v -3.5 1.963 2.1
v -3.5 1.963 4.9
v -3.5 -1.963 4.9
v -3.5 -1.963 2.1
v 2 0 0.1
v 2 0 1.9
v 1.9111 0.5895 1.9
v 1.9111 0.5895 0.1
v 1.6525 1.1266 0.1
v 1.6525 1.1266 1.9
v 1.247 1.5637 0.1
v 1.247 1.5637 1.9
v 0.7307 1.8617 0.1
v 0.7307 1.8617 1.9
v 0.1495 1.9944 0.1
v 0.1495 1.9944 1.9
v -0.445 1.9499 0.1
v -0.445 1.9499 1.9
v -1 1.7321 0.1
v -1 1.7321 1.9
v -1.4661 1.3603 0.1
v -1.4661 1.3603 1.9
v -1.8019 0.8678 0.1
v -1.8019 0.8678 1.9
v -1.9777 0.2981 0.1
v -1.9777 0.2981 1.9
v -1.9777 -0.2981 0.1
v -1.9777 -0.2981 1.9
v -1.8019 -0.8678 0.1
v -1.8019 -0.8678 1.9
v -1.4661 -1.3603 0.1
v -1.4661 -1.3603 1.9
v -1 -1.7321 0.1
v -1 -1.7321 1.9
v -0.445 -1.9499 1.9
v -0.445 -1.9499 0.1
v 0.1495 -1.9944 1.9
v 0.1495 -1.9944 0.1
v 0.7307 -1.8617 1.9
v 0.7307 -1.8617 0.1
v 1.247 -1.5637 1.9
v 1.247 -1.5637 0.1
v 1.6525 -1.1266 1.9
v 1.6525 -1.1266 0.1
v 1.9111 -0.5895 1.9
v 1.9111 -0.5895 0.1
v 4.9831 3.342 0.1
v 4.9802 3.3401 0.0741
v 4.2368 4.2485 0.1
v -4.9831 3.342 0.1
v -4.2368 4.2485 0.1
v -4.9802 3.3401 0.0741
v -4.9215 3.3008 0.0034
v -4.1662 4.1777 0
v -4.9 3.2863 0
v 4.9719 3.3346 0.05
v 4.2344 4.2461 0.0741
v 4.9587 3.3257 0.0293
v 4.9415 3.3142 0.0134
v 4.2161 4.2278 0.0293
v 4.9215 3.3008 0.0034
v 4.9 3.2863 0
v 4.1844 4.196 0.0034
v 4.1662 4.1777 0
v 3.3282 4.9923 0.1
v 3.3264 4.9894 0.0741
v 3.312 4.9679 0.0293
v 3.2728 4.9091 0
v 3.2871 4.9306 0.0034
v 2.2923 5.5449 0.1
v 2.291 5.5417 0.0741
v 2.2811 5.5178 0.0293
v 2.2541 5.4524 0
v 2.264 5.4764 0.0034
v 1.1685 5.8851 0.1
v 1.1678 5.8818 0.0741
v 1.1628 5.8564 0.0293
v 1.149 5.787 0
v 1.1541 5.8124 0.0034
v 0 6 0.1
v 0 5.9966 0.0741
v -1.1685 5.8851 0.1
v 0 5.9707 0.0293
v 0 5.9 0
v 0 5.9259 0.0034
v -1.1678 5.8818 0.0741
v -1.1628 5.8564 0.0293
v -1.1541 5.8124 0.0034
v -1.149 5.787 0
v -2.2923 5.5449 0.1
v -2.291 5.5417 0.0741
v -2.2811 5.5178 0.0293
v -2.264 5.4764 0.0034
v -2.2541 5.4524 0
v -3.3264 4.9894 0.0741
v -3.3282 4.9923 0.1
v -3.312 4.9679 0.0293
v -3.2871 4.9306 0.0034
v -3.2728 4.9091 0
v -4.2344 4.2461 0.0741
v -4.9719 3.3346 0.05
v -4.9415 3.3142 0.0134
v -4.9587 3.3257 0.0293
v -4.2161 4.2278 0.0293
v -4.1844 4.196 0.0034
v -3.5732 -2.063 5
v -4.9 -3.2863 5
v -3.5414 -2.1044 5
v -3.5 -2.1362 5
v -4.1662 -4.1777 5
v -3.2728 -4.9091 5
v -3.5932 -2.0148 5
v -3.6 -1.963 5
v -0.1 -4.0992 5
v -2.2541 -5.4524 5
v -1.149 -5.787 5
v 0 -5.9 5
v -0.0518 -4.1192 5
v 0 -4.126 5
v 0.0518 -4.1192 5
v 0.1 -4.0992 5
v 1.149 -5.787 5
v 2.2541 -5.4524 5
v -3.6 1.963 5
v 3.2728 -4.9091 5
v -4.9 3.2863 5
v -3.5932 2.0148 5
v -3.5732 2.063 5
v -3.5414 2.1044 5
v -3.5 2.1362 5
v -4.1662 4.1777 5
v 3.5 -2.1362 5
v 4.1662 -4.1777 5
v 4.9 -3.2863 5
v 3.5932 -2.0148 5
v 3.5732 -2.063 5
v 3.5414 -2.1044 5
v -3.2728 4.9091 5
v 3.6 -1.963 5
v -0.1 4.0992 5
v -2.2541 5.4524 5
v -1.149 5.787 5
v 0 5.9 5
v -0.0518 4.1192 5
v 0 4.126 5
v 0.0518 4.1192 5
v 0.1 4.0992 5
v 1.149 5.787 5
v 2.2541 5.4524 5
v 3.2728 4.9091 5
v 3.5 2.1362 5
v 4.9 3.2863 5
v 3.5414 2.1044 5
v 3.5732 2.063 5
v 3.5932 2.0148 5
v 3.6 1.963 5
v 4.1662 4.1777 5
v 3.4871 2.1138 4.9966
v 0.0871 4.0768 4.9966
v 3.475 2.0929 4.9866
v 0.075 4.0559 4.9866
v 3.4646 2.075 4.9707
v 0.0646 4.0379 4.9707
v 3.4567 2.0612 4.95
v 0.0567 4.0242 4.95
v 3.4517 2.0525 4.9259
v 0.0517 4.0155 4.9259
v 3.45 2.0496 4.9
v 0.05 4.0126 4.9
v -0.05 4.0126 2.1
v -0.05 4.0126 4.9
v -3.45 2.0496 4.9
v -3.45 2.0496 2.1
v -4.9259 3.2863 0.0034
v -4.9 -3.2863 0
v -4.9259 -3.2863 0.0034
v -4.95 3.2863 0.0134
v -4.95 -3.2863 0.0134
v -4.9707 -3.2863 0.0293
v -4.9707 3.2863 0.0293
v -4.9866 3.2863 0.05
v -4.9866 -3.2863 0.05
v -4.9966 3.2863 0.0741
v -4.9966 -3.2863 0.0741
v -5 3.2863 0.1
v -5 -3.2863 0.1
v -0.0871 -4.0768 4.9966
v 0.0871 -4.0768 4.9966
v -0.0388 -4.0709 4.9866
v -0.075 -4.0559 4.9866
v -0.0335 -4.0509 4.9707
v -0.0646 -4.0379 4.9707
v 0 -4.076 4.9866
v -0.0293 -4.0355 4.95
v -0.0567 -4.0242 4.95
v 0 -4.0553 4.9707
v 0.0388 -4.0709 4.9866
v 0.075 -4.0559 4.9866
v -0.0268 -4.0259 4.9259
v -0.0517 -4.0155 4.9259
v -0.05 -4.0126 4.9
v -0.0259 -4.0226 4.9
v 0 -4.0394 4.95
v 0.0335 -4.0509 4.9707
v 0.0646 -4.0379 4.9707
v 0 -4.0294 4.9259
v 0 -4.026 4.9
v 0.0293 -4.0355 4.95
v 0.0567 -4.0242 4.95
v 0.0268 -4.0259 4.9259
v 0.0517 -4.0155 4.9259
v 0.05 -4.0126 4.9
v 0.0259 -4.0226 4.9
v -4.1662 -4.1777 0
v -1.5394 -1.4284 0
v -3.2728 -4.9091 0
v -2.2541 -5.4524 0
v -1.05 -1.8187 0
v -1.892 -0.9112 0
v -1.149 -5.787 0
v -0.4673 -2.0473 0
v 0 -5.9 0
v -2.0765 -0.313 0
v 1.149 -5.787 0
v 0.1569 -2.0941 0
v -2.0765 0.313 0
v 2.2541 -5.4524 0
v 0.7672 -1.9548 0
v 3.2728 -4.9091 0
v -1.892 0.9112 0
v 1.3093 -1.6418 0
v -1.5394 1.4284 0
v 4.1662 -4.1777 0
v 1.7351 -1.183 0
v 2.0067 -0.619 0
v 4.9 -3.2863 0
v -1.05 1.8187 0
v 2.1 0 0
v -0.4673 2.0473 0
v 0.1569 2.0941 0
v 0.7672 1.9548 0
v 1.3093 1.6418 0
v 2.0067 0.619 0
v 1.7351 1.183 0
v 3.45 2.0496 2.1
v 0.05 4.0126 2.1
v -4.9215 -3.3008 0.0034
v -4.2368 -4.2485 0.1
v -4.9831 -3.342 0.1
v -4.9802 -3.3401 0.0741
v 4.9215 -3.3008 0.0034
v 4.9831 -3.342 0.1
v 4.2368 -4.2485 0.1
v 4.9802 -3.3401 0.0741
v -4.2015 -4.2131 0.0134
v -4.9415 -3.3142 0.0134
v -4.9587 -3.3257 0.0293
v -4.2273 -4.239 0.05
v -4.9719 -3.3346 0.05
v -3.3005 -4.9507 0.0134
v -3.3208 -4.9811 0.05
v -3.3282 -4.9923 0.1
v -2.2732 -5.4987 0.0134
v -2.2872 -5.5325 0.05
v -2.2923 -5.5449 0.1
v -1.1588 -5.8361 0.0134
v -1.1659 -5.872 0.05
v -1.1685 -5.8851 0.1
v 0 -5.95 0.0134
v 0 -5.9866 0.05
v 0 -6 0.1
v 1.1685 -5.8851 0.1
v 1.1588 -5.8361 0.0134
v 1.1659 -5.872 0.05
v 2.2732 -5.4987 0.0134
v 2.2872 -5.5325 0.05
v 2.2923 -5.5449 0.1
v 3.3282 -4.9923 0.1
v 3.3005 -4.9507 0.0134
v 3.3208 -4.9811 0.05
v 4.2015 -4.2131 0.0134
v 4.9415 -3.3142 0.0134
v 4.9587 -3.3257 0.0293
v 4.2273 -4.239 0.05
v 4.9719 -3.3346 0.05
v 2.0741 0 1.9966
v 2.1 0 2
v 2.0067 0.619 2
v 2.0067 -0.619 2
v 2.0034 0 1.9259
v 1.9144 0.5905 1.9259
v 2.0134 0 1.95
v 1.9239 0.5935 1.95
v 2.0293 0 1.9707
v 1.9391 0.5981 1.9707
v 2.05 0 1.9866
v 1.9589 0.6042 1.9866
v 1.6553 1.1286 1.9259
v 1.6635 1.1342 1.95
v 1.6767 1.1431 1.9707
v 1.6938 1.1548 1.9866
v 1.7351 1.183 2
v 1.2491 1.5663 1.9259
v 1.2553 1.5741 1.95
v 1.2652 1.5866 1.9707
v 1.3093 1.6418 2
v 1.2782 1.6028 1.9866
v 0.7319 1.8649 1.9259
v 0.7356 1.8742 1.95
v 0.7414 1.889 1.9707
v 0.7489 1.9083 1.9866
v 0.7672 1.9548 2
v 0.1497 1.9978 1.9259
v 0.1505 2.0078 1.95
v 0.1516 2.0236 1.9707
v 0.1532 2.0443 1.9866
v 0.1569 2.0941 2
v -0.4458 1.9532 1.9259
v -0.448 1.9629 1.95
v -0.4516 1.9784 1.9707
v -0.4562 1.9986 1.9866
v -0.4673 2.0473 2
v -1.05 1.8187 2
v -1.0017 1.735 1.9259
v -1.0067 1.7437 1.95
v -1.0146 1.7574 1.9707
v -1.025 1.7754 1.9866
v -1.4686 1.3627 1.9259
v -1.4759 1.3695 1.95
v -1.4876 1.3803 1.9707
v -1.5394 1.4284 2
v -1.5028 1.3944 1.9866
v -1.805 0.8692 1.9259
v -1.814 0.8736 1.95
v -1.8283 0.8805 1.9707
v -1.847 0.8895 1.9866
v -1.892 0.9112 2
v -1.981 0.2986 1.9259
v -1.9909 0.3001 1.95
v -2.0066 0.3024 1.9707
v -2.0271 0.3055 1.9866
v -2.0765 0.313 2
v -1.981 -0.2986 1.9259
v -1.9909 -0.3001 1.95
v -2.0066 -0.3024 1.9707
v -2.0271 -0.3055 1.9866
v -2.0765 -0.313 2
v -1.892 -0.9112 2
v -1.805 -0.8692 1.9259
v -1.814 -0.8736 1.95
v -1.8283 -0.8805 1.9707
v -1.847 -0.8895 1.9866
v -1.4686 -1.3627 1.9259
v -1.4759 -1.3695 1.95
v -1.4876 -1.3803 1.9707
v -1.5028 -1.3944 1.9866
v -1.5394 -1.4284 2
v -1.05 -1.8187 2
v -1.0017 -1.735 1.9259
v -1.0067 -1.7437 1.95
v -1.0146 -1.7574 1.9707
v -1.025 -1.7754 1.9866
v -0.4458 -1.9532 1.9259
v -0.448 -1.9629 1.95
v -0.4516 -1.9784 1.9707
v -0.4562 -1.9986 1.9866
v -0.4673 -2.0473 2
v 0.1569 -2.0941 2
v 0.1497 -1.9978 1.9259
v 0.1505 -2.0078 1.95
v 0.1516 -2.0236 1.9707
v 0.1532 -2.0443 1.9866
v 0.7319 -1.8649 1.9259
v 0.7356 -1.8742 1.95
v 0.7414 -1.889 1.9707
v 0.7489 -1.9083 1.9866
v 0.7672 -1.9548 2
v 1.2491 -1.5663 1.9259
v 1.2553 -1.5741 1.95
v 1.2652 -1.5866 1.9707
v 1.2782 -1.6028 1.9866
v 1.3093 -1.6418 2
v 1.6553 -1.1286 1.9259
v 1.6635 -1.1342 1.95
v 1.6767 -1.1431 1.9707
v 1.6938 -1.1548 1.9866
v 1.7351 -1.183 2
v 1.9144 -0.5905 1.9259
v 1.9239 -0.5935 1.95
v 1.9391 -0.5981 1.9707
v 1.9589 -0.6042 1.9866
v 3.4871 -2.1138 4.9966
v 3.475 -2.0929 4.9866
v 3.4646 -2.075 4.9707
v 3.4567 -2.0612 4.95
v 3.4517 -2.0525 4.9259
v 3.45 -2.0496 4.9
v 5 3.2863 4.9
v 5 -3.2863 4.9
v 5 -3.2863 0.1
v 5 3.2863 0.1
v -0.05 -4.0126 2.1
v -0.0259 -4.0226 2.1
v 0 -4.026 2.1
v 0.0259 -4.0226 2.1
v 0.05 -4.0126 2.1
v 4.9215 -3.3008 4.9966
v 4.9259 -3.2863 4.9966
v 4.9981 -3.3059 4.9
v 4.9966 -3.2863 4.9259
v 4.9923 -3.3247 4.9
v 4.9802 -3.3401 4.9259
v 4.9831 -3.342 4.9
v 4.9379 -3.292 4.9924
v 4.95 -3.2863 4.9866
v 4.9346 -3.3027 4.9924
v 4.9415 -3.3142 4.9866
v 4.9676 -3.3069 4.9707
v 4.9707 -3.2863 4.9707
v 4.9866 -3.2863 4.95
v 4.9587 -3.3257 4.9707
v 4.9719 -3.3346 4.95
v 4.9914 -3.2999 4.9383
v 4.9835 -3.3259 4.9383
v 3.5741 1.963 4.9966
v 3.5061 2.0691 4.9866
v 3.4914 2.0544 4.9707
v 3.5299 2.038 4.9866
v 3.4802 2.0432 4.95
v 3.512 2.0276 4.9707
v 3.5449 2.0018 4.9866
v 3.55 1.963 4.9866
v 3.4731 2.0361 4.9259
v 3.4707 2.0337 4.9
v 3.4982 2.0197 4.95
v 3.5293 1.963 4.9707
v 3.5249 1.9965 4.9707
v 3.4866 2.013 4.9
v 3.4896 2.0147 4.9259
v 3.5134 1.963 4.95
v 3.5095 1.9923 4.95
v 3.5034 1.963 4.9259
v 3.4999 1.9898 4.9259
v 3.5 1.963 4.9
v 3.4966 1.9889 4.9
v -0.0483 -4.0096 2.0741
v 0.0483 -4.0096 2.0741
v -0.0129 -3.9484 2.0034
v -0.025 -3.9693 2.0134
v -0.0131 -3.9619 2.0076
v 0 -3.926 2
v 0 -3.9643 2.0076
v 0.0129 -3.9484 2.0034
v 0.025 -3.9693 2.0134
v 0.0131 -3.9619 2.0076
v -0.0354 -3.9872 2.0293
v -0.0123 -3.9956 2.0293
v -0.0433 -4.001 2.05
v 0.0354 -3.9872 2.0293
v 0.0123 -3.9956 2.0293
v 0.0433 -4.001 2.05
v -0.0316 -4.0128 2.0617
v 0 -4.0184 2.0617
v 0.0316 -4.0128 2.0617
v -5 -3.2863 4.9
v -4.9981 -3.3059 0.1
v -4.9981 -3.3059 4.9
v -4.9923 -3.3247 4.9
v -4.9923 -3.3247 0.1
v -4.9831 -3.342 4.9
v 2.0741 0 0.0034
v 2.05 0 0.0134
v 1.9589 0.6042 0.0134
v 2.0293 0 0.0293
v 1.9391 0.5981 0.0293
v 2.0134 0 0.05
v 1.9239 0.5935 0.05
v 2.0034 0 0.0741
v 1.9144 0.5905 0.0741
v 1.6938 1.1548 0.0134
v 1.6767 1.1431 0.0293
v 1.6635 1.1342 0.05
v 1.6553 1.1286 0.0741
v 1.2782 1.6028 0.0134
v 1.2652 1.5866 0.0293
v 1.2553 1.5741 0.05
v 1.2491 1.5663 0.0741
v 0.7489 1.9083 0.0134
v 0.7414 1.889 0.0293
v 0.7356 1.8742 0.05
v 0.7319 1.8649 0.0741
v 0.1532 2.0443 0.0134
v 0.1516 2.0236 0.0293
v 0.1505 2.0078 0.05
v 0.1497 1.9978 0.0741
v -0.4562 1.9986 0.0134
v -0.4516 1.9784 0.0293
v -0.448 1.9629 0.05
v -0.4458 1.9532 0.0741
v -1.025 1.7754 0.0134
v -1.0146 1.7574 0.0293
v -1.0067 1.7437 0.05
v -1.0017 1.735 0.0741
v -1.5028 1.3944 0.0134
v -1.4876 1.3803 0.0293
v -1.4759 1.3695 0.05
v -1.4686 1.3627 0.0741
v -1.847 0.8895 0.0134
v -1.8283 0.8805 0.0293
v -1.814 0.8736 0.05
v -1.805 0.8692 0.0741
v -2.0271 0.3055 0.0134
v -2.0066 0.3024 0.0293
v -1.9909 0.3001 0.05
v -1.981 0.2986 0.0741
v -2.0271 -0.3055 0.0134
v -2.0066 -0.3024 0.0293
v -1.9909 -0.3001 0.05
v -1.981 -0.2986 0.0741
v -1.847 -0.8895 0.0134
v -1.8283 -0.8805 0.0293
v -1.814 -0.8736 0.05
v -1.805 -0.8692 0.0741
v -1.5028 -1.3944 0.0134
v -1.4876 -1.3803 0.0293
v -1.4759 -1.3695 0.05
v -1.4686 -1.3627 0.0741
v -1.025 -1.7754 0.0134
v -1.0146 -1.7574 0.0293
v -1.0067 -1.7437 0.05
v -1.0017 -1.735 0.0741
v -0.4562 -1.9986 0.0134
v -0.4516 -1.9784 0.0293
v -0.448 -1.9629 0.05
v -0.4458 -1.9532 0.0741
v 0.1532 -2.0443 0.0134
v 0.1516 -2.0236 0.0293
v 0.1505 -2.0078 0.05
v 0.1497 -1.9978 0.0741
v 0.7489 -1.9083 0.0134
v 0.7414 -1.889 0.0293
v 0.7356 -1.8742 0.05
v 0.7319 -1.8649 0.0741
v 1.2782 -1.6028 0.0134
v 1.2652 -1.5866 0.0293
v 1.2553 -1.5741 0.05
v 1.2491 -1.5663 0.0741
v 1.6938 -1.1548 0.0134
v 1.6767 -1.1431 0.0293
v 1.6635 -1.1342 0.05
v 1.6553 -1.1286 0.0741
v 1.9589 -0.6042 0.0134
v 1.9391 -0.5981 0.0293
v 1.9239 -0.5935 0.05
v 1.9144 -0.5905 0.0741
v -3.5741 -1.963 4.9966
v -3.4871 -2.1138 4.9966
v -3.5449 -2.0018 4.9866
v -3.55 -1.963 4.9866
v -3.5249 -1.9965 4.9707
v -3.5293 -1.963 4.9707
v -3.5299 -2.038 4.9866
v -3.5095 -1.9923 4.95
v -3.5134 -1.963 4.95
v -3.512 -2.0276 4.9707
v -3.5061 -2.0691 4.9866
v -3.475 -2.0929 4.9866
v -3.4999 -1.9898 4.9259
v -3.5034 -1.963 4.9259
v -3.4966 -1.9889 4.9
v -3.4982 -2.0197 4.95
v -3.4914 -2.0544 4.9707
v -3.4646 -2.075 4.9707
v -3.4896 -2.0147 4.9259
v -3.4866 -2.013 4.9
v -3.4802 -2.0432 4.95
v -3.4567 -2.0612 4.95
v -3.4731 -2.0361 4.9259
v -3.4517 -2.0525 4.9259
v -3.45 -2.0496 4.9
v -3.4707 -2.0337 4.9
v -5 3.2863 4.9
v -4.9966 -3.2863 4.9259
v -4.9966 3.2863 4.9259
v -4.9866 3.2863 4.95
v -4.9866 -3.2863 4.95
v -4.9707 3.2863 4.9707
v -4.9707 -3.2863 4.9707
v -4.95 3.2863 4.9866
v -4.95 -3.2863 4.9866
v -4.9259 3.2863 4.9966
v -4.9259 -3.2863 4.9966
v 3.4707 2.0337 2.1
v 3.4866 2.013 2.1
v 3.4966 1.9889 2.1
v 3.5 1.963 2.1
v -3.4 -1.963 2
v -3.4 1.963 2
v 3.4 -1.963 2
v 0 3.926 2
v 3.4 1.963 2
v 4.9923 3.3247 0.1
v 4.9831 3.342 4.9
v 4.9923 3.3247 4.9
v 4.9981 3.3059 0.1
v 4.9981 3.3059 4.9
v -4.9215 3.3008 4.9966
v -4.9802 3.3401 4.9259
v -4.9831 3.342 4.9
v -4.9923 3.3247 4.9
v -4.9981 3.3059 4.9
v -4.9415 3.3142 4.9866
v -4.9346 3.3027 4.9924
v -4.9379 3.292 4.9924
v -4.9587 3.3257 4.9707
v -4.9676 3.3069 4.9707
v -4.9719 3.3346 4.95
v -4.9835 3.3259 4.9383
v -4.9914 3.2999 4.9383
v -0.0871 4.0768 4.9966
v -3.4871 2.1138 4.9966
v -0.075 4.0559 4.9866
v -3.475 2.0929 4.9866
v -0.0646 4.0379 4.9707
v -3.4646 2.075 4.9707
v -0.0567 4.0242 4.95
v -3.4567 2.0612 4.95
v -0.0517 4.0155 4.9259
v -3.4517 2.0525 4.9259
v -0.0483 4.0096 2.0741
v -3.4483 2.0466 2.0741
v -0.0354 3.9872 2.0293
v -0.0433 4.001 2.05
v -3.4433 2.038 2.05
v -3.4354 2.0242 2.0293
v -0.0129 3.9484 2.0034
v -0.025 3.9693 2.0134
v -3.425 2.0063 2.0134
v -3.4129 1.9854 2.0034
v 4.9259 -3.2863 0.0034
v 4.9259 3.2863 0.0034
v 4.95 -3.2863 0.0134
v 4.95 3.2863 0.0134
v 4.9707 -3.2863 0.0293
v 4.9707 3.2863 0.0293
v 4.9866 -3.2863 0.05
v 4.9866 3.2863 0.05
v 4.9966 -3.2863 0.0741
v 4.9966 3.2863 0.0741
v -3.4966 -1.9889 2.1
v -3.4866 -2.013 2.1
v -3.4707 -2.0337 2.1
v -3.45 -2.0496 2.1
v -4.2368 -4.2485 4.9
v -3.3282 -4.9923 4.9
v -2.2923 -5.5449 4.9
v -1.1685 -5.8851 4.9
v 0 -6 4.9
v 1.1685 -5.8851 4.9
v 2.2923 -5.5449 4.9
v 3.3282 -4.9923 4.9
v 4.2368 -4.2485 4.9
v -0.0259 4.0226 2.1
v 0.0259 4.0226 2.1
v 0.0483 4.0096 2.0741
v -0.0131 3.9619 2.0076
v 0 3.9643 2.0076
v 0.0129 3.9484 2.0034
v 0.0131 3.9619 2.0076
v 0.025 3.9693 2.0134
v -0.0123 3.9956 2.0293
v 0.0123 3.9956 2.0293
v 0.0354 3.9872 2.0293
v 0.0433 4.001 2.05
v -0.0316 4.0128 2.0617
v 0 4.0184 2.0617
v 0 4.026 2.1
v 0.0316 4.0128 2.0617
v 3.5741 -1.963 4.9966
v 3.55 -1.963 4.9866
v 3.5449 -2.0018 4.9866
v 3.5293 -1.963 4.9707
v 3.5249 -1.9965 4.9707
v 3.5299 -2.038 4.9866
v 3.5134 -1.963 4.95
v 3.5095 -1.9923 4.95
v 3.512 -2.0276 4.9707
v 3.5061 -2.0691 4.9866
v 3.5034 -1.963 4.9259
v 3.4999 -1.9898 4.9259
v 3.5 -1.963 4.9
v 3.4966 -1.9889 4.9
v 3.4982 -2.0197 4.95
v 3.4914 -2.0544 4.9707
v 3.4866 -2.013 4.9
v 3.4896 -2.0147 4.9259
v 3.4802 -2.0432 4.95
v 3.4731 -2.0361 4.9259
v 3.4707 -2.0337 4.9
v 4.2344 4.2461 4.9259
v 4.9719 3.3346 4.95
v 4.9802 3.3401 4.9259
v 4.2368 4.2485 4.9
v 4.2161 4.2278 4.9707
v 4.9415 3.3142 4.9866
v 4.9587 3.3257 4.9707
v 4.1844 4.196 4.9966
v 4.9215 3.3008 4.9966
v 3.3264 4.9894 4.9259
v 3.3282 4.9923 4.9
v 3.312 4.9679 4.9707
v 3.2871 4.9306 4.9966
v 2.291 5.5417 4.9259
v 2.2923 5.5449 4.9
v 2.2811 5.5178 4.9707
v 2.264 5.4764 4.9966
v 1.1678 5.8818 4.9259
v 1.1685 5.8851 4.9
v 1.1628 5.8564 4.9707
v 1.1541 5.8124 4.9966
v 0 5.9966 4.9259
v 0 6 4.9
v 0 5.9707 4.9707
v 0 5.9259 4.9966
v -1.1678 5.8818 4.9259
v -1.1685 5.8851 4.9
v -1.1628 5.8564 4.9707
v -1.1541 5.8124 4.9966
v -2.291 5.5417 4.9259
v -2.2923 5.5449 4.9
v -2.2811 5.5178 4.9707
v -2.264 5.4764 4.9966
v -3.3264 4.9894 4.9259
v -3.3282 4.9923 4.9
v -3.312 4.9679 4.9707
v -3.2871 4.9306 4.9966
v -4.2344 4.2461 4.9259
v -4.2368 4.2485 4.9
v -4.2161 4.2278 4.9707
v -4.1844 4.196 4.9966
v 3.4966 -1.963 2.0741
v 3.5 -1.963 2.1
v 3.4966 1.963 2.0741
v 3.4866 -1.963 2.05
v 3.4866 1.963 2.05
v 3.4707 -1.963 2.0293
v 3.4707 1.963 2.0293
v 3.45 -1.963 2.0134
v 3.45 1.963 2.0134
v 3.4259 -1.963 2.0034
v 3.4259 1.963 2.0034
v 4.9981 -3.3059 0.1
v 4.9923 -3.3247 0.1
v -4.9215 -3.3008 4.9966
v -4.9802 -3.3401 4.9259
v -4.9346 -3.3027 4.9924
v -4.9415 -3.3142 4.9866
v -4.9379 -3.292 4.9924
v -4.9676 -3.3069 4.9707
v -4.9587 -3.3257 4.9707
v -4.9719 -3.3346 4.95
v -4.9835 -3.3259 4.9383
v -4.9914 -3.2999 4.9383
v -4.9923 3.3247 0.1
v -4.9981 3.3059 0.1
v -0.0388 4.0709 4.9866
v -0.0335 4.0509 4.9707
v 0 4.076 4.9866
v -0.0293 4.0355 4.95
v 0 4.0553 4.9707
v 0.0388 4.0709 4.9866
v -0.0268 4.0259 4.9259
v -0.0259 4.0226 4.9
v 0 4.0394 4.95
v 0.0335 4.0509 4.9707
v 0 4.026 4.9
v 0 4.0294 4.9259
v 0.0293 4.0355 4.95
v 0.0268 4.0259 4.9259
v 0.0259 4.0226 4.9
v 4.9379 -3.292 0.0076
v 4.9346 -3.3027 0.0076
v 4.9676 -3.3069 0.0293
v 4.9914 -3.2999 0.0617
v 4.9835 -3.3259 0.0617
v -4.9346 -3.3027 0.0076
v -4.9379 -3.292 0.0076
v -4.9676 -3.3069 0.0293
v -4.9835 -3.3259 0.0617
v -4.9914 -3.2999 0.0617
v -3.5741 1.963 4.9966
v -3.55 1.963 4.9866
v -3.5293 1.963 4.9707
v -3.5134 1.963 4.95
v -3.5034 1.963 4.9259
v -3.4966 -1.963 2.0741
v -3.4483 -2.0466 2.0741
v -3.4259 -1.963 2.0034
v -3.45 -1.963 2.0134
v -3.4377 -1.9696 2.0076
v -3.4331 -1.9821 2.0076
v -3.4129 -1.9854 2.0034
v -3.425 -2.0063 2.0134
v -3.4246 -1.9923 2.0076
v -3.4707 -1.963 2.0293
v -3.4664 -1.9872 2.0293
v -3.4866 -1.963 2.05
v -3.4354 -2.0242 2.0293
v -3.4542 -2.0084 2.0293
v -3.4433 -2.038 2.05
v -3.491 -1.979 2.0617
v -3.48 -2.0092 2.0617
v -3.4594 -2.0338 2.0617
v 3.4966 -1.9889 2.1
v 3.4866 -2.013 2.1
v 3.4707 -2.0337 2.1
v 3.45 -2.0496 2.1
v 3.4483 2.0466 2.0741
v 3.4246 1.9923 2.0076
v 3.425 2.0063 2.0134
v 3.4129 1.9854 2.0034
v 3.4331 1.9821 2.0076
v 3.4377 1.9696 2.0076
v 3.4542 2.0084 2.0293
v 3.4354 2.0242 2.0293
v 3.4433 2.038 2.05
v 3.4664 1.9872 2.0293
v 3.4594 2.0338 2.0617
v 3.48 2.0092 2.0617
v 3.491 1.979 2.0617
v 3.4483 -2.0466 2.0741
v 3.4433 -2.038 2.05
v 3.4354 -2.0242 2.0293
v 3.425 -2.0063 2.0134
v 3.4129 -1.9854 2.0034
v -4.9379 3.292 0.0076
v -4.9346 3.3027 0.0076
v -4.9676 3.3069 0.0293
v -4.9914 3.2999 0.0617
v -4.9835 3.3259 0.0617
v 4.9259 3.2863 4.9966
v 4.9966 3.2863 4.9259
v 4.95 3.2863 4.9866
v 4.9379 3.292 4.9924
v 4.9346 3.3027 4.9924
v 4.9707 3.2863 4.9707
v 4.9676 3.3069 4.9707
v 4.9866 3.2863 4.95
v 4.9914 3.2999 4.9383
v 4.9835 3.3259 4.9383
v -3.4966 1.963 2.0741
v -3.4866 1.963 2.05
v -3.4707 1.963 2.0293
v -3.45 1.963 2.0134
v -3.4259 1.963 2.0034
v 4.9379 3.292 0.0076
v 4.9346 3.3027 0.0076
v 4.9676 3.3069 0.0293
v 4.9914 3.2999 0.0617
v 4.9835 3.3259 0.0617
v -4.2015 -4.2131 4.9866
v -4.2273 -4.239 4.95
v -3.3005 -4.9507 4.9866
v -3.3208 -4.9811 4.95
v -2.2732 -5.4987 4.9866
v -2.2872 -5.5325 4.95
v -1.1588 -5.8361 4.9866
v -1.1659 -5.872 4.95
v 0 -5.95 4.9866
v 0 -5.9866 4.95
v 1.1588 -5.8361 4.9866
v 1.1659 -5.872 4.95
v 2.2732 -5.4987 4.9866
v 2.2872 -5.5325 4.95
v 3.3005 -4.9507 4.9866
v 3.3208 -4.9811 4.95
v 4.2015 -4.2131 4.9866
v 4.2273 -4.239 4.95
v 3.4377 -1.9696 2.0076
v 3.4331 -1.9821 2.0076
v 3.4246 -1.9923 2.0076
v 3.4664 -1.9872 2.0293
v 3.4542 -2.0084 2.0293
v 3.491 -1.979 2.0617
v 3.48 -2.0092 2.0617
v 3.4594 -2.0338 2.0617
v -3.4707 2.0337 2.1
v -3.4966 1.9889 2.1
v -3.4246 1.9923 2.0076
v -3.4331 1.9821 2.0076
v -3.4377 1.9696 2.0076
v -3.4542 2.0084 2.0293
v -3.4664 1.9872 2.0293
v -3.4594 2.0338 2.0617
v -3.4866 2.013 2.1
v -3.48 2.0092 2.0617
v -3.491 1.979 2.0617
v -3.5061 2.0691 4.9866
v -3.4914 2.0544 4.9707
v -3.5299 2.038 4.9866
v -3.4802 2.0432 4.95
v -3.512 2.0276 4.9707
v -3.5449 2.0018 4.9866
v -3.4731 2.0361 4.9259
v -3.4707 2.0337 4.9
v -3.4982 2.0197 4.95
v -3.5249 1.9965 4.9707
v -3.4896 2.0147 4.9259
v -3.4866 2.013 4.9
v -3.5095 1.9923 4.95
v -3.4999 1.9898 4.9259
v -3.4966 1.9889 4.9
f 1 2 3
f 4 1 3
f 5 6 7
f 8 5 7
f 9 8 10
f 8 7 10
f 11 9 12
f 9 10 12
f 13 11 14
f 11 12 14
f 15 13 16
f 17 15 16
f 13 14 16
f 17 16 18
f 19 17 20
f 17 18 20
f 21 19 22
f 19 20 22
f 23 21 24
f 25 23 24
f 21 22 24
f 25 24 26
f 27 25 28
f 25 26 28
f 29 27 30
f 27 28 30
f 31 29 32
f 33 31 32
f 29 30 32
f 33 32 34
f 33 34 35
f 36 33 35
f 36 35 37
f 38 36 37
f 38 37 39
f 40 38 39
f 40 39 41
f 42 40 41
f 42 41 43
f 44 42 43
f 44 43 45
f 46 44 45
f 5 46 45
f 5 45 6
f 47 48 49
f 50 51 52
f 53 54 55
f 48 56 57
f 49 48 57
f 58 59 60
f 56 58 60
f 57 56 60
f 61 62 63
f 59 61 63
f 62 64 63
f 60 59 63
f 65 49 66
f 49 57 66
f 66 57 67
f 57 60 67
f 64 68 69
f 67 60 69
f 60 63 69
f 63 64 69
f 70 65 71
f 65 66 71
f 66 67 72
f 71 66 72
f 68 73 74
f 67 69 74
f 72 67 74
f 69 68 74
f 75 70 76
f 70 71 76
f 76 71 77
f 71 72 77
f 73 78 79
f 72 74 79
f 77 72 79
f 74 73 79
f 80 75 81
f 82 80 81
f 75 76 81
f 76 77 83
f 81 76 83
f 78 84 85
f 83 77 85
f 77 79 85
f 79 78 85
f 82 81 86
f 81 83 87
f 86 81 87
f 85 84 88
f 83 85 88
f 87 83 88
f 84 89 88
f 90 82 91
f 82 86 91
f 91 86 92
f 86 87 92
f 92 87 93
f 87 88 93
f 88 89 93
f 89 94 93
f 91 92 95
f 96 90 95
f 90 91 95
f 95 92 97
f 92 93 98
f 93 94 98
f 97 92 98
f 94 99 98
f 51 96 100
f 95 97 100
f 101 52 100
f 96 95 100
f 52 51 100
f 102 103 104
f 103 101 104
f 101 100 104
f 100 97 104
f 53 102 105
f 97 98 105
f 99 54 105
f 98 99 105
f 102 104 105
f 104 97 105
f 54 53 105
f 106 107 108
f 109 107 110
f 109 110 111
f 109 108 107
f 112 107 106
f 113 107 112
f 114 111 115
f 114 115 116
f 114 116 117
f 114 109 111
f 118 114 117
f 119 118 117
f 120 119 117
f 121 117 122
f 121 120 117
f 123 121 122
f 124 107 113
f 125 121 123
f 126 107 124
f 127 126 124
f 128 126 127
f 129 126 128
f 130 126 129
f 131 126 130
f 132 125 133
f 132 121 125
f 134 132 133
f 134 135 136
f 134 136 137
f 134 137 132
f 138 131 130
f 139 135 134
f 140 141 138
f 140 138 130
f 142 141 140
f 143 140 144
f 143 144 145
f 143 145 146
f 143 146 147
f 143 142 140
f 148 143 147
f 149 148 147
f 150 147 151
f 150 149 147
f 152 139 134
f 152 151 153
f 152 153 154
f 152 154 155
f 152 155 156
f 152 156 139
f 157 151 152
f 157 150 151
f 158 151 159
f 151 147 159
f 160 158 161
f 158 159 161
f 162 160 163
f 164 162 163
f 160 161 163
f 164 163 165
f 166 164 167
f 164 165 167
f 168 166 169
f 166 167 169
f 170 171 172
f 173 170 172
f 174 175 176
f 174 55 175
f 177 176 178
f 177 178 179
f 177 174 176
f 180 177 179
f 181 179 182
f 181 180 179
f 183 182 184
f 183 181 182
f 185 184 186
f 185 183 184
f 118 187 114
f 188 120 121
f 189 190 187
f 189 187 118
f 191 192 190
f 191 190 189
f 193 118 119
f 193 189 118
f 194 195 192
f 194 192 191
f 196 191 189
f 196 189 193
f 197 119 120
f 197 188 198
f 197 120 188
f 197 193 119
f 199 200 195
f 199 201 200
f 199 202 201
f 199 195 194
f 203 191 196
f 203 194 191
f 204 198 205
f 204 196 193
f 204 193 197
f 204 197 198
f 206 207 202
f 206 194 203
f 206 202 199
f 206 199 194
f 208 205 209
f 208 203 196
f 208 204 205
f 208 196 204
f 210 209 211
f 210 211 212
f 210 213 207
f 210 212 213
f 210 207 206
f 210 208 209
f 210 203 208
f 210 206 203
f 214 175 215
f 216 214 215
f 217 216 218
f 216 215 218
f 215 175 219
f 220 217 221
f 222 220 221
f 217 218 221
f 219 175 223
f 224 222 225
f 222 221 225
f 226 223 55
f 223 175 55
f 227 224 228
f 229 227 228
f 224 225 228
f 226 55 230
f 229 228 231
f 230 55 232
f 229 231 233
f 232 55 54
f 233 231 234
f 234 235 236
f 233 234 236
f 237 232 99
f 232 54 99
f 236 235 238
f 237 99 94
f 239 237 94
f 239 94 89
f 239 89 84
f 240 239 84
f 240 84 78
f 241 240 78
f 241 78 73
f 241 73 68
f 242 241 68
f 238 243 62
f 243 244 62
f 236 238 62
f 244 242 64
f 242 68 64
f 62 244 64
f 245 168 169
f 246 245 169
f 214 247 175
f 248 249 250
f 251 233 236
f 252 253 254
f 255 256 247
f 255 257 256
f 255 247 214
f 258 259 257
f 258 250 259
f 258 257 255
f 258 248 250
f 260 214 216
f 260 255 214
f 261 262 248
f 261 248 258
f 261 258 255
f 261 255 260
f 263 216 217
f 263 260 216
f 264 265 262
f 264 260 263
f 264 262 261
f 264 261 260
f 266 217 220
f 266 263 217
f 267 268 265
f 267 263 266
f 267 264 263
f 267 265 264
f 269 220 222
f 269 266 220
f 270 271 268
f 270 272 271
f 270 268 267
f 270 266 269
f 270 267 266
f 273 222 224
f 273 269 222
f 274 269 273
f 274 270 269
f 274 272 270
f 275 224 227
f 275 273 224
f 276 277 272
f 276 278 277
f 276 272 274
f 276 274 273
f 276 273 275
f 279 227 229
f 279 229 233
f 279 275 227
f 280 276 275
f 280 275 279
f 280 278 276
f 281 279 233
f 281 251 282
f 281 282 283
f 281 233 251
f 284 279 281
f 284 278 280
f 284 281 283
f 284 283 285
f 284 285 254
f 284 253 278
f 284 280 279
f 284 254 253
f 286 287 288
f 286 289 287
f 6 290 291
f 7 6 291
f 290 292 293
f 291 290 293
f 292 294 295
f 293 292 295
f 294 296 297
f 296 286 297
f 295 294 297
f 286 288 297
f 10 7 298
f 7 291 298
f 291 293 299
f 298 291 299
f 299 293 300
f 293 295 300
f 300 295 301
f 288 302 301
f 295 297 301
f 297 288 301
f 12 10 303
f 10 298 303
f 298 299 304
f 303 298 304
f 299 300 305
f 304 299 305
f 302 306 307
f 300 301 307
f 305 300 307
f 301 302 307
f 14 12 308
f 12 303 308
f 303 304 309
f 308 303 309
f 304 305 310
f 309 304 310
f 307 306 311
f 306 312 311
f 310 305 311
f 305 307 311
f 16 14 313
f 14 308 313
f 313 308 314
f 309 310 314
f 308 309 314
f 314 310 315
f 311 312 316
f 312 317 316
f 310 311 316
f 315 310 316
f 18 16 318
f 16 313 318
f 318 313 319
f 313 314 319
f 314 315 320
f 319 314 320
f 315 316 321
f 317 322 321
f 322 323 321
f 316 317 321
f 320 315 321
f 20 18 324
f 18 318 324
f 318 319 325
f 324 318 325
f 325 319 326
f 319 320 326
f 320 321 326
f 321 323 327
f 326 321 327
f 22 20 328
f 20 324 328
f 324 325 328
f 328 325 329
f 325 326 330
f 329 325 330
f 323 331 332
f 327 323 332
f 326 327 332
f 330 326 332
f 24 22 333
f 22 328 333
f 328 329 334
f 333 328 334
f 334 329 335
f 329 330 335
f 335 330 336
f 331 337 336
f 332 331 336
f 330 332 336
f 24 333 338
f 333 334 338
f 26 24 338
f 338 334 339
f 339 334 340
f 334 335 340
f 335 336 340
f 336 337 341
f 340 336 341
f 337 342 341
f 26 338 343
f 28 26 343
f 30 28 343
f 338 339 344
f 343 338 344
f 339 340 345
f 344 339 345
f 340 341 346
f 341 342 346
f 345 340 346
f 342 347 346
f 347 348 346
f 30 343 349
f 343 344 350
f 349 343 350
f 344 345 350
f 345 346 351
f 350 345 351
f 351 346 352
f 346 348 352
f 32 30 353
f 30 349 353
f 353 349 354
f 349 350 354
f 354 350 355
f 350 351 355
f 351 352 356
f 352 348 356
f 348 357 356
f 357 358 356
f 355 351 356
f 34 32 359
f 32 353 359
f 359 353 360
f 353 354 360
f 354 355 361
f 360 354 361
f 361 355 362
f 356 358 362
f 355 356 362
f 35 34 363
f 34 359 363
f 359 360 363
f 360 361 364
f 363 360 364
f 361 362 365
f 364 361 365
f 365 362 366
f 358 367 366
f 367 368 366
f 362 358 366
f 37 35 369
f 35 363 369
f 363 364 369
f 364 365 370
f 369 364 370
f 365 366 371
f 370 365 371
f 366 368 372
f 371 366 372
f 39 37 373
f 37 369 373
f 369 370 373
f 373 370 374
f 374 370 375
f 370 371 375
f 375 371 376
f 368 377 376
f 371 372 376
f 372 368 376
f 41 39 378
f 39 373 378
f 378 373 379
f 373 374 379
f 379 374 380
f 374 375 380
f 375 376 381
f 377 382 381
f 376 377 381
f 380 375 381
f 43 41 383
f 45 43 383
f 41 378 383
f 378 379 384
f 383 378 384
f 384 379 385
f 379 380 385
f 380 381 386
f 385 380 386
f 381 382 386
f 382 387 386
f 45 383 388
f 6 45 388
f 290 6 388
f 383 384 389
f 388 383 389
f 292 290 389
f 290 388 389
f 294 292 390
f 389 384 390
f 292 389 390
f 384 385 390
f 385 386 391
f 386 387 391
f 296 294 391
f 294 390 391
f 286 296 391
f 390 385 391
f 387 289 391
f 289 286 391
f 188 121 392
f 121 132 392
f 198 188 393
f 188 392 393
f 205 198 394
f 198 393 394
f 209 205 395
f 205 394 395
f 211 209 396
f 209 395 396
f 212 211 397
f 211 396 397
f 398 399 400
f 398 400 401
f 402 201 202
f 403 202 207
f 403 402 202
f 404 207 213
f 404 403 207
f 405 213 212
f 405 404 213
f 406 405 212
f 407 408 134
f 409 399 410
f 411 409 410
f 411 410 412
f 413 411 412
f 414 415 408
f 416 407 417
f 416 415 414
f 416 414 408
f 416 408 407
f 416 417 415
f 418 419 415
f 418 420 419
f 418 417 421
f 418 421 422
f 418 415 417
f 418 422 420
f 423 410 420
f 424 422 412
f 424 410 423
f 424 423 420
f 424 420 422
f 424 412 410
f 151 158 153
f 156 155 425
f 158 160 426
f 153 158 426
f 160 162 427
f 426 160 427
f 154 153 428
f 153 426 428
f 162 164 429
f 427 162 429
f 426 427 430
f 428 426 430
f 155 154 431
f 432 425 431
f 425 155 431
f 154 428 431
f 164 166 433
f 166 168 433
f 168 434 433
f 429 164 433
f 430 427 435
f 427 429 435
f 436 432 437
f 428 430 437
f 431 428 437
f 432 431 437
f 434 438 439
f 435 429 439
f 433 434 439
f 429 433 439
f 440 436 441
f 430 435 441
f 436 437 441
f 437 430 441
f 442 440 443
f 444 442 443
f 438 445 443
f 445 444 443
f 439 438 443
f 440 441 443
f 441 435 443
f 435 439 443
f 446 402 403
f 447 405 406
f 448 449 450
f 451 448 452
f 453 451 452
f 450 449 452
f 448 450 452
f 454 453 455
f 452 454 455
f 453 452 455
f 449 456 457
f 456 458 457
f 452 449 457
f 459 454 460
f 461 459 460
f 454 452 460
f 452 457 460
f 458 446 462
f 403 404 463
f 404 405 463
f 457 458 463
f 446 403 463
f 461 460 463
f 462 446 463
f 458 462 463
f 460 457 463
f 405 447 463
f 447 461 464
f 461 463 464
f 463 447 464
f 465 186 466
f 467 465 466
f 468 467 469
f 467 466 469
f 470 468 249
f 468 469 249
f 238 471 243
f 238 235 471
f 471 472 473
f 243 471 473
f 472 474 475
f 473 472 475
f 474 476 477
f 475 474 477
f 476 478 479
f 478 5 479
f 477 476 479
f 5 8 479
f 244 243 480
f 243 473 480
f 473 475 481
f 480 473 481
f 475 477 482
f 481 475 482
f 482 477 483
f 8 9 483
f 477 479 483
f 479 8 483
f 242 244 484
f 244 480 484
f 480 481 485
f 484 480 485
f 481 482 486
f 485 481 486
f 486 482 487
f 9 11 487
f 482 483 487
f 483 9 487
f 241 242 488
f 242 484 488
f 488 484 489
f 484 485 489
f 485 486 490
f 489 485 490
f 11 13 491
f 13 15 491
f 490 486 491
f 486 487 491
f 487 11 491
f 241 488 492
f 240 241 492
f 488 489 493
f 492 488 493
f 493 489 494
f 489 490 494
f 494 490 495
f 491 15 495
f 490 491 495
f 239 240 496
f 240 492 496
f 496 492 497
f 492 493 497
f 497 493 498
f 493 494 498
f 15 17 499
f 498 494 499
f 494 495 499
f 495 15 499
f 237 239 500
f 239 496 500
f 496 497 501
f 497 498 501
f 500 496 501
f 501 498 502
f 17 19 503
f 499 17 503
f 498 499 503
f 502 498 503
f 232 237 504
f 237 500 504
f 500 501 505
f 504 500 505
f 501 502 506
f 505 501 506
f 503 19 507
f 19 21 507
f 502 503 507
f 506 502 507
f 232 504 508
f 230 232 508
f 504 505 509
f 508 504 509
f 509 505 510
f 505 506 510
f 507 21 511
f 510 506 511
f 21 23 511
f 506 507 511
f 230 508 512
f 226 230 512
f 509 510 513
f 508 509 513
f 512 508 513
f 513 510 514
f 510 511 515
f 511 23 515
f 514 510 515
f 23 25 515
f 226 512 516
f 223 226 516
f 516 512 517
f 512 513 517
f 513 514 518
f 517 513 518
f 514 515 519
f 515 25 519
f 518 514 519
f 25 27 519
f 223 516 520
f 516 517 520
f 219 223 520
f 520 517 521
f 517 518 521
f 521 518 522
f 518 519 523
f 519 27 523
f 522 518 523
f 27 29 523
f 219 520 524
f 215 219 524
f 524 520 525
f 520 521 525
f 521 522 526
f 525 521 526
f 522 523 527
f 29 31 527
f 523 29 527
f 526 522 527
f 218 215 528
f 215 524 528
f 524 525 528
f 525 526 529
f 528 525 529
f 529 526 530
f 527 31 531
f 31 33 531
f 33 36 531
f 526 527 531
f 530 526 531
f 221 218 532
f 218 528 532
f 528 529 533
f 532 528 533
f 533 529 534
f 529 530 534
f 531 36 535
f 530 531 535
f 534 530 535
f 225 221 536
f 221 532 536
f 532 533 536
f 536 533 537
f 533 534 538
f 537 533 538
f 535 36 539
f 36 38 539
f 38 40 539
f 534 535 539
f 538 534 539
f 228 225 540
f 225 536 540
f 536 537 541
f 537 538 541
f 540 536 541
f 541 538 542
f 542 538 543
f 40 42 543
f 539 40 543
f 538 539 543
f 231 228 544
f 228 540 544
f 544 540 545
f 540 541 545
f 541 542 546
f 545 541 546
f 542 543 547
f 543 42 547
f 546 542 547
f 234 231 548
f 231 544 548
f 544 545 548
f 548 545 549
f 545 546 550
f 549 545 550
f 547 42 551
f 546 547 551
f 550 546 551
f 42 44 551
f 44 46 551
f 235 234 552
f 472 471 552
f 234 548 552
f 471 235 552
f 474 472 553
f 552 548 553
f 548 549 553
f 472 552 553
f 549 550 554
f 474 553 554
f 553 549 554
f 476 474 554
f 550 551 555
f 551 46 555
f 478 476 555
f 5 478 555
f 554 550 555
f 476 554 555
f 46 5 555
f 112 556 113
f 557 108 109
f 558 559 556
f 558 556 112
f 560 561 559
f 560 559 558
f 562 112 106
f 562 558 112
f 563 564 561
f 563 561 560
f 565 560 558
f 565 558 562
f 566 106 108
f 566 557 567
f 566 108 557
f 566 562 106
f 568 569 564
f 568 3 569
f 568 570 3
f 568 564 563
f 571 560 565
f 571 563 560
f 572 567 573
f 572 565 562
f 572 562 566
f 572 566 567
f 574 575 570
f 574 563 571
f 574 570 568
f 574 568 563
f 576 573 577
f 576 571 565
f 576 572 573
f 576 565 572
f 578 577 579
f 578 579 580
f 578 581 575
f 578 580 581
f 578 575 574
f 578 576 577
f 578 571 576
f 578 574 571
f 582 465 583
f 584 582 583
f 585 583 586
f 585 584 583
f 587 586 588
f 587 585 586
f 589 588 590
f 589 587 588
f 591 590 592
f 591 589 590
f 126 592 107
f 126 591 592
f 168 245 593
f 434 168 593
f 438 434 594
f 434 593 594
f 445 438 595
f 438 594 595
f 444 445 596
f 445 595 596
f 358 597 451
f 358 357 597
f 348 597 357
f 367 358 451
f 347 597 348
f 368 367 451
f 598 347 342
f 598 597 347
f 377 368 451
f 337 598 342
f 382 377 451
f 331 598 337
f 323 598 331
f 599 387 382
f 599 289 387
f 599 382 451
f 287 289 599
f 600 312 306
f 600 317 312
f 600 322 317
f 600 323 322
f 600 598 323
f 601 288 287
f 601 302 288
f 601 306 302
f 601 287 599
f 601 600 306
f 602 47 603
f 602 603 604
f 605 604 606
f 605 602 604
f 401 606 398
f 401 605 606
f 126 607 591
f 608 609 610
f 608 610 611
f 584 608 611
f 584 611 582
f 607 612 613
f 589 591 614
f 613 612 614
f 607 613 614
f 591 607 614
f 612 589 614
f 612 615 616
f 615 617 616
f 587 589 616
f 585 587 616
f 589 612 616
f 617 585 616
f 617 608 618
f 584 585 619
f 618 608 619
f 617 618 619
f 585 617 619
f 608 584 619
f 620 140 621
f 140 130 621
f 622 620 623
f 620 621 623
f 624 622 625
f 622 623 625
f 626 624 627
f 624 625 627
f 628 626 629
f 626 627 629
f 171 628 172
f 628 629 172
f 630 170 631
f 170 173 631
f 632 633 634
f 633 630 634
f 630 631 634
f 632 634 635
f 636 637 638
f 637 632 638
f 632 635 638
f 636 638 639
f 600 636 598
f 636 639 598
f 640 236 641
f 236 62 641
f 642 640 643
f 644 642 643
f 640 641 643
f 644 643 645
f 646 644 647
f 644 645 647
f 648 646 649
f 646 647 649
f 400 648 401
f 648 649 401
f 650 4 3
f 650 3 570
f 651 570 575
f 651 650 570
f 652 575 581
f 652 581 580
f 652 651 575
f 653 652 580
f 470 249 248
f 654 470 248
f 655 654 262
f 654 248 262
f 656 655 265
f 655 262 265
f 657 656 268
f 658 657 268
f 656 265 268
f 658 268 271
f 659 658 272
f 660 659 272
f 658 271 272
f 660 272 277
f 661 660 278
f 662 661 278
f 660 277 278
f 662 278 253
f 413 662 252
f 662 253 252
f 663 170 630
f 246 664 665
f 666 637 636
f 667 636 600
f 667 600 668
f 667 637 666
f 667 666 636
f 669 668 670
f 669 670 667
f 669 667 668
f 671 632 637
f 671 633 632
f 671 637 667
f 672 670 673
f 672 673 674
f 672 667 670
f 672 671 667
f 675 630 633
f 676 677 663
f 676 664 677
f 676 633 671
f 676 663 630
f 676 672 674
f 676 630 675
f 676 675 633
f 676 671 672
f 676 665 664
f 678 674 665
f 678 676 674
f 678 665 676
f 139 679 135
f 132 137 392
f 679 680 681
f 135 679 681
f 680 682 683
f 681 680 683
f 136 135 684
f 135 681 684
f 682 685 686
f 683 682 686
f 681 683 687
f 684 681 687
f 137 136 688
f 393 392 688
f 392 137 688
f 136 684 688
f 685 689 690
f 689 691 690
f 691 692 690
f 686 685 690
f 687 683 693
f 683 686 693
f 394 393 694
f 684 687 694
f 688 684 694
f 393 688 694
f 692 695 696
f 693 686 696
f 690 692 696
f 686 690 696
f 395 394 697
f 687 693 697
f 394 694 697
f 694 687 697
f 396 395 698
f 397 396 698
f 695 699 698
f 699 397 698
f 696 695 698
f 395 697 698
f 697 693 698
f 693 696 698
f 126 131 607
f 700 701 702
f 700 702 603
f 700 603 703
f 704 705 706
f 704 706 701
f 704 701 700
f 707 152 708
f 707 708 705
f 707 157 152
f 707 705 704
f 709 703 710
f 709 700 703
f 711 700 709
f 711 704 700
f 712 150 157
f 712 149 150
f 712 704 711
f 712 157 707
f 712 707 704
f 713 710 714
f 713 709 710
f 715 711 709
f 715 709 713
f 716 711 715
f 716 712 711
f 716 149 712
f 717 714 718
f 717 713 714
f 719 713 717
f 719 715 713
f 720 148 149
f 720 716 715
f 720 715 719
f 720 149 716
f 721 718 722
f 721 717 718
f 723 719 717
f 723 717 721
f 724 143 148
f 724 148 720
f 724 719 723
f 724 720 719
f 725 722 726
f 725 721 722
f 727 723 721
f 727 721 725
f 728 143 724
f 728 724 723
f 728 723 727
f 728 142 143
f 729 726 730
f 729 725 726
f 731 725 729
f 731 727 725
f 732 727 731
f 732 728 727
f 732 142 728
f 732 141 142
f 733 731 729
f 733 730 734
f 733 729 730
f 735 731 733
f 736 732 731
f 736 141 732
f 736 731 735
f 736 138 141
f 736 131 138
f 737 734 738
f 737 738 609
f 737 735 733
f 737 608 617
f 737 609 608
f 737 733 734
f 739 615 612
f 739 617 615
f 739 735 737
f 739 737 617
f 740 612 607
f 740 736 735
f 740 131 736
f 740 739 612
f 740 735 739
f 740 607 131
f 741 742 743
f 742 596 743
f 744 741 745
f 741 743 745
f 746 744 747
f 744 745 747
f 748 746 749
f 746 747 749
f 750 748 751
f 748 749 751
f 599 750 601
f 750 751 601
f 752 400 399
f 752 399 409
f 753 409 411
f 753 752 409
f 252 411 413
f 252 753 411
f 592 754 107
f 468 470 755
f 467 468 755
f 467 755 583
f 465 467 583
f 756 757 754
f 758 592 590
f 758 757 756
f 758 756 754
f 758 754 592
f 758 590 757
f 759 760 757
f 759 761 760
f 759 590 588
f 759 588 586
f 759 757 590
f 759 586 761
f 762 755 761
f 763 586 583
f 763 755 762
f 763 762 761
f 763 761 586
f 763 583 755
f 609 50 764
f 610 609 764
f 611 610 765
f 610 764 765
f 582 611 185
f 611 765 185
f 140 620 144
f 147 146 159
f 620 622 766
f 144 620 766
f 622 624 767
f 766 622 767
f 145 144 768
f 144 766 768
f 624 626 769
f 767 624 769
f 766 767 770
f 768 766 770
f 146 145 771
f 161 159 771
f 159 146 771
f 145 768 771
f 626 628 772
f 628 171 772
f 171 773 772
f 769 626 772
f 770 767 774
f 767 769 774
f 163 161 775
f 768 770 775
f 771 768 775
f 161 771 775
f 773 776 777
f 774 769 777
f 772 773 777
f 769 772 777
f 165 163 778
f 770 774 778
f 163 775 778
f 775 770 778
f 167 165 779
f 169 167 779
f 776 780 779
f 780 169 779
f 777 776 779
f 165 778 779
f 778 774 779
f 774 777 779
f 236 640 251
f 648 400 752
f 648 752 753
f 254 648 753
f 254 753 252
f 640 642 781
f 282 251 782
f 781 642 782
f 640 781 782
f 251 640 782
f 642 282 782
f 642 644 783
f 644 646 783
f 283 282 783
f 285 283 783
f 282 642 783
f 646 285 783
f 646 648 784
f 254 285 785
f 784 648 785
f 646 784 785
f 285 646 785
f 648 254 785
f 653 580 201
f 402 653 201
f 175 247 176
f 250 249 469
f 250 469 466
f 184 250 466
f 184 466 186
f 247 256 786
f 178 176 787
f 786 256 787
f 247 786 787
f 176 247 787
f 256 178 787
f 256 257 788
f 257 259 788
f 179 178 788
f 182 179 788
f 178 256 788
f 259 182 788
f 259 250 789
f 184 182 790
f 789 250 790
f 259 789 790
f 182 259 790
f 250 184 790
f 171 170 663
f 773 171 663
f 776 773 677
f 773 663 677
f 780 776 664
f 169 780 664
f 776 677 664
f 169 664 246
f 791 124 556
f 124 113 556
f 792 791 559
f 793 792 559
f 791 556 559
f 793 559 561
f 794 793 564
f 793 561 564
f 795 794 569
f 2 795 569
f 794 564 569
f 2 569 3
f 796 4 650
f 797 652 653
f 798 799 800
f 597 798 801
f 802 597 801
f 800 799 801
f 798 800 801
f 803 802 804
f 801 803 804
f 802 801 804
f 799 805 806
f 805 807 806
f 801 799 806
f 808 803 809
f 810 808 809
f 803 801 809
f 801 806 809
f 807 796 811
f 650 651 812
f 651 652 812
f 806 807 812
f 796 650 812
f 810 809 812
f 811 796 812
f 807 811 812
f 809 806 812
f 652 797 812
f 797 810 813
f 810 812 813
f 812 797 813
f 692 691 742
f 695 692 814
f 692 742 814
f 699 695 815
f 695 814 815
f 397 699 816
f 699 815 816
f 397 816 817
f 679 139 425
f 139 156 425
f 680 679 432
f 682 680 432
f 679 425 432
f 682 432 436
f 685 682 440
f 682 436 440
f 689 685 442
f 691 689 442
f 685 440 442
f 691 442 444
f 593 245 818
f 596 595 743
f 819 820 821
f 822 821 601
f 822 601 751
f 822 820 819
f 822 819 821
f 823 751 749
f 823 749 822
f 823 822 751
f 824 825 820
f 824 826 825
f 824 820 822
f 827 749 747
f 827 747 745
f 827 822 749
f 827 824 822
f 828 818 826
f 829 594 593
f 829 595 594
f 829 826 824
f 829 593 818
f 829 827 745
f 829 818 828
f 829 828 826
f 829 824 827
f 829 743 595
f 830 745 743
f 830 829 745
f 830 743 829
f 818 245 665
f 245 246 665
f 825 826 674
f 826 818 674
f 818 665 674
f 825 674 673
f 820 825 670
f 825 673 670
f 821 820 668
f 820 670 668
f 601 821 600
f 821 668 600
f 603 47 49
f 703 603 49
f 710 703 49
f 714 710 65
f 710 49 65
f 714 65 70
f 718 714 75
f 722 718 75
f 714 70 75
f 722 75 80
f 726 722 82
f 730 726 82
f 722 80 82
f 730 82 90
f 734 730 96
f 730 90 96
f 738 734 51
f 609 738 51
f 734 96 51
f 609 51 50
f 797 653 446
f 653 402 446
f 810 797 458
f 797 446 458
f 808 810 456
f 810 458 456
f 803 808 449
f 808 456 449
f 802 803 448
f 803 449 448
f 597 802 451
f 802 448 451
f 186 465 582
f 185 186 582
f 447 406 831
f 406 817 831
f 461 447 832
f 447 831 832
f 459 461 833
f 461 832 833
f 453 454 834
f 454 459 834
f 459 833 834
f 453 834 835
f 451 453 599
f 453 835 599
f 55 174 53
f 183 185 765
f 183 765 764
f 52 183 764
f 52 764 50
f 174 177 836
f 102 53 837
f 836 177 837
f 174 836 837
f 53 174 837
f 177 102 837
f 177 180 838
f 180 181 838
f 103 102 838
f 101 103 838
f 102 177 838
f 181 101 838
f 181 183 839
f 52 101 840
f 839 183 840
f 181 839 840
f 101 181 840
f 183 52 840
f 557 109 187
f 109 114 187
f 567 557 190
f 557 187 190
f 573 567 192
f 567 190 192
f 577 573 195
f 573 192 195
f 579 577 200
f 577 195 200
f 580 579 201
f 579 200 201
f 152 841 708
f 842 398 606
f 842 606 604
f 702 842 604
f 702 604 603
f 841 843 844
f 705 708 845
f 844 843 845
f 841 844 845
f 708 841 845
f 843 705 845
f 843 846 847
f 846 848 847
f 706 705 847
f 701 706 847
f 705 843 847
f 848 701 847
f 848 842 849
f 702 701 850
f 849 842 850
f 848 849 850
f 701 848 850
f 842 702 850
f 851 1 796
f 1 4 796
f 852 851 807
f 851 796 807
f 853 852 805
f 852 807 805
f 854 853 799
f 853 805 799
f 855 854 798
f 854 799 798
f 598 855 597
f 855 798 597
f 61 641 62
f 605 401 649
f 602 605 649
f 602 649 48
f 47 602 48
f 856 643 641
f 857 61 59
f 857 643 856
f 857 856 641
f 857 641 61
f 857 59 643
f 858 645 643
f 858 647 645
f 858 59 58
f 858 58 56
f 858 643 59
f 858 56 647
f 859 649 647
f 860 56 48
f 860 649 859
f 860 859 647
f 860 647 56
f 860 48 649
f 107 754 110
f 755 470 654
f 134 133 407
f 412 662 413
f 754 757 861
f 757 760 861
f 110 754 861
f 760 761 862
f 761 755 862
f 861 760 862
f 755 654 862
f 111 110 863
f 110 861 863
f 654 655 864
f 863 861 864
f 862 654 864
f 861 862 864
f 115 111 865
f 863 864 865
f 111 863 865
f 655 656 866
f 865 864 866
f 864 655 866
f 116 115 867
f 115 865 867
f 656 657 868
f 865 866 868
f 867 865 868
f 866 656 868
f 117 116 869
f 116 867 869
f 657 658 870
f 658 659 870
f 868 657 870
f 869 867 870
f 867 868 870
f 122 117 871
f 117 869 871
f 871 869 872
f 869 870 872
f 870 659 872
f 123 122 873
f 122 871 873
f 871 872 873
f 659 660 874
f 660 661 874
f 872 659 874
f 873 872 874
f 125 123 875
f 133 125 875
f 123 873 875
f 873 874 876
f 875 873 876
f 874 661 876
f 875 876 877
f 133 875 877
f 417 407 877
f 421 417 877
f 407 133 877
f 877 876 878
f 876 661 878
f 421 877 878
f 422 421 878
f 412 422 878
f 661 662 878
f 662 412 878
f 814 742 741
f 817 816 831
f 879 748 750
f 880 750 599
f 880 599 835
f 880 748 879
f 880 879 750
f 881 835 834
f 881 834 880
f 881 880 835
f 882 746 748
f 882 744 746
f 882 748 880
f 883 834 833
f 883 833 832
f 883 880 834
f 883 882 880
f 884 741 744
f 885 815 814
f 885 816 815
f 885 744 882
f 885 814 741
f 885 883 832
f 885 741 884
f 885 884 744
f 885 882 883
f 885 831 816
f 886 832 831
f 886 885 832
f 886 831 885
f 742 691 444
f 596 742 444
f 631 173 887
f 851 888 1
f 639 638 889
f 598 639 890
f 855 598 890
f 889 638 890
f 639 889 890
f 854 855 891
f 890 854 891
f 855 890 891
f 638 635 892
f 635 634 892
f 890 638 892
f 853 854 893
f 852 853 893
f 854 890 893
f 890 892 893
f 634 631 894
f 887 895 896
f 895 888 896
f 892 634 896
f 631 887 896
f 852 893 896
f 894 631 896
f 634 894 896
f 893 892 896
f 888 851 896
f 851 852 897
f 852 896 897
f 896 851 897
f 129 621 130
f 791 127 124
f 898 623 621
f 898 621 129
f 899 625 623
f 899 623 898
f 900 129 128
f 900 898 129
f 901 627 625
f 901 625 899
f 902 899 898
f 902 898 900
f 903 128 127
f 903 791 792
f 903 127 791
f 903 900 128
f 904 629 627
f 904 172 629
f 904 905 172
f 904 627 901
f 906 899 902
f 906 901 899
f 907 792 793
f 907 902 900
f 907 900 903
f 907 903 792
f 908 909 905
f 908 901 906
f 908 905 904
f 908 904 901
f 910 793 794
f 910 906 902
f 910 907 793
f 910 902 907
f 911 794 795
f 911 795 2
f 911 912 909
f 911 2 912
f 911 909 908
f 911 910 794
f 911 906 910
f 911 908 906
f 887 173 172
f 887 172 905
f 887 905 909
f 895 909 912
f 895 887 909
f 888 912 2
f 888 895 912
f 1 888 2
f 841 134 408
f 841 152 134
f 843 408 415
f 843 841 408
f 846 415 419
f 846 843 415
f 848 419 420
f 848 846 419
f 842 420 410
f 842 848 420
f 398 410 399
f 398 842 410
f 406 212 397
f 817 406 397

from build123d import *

# Parameters (mm, degrees)
ESQUISSE1_R             = 6
EXTRUSION1_DEPTH        = 5
ENL_V_MAT_EXTRU_1_DEPTH = 3
ESQUISSE3_W             = 3.158529234
ESQUISSE3_H             = 10.681133213
ENL_V_MAT_EXTRU_2_DEPTH = 10.848857802
ESQUISSE4_R             = 2
ENL_V_MAT_EXTRU_3_DEPTH = 9.366600265
CONG_1_R                = 0.1


with BuildPart() as part:
    # Esquisse1 → Extrusion1 (new body)
    with BuildSketch(Plane.XY):
        Circle(ESQUISSE1_R)
    extrude(amount=EXTRUSION1_DEPTH)

    # Esquisse2 → Enlèv. mat.-Extru.1 (cut)
    with BuildSketch(Plane.XY.offset(5)):
        Polygon((0, 4.041451884), (-3.5, 2.020725942), (-3.5, -2.020725942), (0, -4.041451884), (3.5, -2.020725942), (3.5, 2.020725942), align=None)
    extrude(amount=-ENL_V_MAT_EXTRU_1_DEPTH, mode=Mode.SUBTRACT)

    # Esquisse3 → Enlèv. mat.-Extru.2 (cut, through all)
    with BuildSketch(Plane.XY.offset(5)):
        with Locations((-6.579264617, 0.289330923)):
            Rectangle(ESQUISSE3_W, ESQUISSE3_H)
        with Locations((6.579264617, 0.289330923)):
            Rectangle(ESQUISSE3_W, ESQUISSE3_H)
    extrude(amount=-ENL_V_MAT_EXTRU_2_DEPTH, mode=Mode.SUBTRACT)

    # Esquisse4 → Enlèv. mat.-Extru.3 (cut, through all)
    with BuildSketch(Plane.XY.offset(2)):
        Circle(ESQUISSE4_R)
    extrude(amount=-ENL_V_MAT_EXTRU_3_DEPTH, mode=Mode.SUBTRACT)

    # Congé1
    cong_1_edges = [part.edges().sort_by_distance(p)[0] for p in [
        (0, 6, 0),
        (-5, 3.31662479, 2.5),
        (0, 6, 5),
        (5, 3.31662479, 2.5),
        (5, 0, 0),
        (0, -6, 0),
        (-5, 0, 0),
        (-2, 0, 0),
        (-5, 0, 5),
        (-5, -3.31662479, 2.5),
        (5, 0, 5),
        (0, -6, 5),
        (-1.75, 3.031088913, 5),
        (1.75, 3.031088913, 5),
        (-3.5, 0, 5),
        (3.5, 0, 5),
        (-1.75, -3.031088913, 5),
        (1.75, -3.031088913, 5),
        (5, -3.31662479, 2.5),
        (-2, 0, 2),
        (0, 4.041451884, 3.5),
        (-3.5, 2.020725942, 3.5),
        (-1.75, 3.031088913, 2),
        (3.5, 2.020725942, 3.5),
        (1.75, 3.031088913, 2),
        (-3.5, -2.020725942, 3.5),
        (-3.5, 0, 2),
        (3.5, -2.020725942, 3.5),
        (3.5, 0, 2),
        (0, -4.041451884, 3.5),
        (-1.75, -3.031088913, 2),
        (1.75, -3.031088913, 2),
    ]]
    fillet(cong_1_edges, radius=CONG_1_R)


solid = part.part
